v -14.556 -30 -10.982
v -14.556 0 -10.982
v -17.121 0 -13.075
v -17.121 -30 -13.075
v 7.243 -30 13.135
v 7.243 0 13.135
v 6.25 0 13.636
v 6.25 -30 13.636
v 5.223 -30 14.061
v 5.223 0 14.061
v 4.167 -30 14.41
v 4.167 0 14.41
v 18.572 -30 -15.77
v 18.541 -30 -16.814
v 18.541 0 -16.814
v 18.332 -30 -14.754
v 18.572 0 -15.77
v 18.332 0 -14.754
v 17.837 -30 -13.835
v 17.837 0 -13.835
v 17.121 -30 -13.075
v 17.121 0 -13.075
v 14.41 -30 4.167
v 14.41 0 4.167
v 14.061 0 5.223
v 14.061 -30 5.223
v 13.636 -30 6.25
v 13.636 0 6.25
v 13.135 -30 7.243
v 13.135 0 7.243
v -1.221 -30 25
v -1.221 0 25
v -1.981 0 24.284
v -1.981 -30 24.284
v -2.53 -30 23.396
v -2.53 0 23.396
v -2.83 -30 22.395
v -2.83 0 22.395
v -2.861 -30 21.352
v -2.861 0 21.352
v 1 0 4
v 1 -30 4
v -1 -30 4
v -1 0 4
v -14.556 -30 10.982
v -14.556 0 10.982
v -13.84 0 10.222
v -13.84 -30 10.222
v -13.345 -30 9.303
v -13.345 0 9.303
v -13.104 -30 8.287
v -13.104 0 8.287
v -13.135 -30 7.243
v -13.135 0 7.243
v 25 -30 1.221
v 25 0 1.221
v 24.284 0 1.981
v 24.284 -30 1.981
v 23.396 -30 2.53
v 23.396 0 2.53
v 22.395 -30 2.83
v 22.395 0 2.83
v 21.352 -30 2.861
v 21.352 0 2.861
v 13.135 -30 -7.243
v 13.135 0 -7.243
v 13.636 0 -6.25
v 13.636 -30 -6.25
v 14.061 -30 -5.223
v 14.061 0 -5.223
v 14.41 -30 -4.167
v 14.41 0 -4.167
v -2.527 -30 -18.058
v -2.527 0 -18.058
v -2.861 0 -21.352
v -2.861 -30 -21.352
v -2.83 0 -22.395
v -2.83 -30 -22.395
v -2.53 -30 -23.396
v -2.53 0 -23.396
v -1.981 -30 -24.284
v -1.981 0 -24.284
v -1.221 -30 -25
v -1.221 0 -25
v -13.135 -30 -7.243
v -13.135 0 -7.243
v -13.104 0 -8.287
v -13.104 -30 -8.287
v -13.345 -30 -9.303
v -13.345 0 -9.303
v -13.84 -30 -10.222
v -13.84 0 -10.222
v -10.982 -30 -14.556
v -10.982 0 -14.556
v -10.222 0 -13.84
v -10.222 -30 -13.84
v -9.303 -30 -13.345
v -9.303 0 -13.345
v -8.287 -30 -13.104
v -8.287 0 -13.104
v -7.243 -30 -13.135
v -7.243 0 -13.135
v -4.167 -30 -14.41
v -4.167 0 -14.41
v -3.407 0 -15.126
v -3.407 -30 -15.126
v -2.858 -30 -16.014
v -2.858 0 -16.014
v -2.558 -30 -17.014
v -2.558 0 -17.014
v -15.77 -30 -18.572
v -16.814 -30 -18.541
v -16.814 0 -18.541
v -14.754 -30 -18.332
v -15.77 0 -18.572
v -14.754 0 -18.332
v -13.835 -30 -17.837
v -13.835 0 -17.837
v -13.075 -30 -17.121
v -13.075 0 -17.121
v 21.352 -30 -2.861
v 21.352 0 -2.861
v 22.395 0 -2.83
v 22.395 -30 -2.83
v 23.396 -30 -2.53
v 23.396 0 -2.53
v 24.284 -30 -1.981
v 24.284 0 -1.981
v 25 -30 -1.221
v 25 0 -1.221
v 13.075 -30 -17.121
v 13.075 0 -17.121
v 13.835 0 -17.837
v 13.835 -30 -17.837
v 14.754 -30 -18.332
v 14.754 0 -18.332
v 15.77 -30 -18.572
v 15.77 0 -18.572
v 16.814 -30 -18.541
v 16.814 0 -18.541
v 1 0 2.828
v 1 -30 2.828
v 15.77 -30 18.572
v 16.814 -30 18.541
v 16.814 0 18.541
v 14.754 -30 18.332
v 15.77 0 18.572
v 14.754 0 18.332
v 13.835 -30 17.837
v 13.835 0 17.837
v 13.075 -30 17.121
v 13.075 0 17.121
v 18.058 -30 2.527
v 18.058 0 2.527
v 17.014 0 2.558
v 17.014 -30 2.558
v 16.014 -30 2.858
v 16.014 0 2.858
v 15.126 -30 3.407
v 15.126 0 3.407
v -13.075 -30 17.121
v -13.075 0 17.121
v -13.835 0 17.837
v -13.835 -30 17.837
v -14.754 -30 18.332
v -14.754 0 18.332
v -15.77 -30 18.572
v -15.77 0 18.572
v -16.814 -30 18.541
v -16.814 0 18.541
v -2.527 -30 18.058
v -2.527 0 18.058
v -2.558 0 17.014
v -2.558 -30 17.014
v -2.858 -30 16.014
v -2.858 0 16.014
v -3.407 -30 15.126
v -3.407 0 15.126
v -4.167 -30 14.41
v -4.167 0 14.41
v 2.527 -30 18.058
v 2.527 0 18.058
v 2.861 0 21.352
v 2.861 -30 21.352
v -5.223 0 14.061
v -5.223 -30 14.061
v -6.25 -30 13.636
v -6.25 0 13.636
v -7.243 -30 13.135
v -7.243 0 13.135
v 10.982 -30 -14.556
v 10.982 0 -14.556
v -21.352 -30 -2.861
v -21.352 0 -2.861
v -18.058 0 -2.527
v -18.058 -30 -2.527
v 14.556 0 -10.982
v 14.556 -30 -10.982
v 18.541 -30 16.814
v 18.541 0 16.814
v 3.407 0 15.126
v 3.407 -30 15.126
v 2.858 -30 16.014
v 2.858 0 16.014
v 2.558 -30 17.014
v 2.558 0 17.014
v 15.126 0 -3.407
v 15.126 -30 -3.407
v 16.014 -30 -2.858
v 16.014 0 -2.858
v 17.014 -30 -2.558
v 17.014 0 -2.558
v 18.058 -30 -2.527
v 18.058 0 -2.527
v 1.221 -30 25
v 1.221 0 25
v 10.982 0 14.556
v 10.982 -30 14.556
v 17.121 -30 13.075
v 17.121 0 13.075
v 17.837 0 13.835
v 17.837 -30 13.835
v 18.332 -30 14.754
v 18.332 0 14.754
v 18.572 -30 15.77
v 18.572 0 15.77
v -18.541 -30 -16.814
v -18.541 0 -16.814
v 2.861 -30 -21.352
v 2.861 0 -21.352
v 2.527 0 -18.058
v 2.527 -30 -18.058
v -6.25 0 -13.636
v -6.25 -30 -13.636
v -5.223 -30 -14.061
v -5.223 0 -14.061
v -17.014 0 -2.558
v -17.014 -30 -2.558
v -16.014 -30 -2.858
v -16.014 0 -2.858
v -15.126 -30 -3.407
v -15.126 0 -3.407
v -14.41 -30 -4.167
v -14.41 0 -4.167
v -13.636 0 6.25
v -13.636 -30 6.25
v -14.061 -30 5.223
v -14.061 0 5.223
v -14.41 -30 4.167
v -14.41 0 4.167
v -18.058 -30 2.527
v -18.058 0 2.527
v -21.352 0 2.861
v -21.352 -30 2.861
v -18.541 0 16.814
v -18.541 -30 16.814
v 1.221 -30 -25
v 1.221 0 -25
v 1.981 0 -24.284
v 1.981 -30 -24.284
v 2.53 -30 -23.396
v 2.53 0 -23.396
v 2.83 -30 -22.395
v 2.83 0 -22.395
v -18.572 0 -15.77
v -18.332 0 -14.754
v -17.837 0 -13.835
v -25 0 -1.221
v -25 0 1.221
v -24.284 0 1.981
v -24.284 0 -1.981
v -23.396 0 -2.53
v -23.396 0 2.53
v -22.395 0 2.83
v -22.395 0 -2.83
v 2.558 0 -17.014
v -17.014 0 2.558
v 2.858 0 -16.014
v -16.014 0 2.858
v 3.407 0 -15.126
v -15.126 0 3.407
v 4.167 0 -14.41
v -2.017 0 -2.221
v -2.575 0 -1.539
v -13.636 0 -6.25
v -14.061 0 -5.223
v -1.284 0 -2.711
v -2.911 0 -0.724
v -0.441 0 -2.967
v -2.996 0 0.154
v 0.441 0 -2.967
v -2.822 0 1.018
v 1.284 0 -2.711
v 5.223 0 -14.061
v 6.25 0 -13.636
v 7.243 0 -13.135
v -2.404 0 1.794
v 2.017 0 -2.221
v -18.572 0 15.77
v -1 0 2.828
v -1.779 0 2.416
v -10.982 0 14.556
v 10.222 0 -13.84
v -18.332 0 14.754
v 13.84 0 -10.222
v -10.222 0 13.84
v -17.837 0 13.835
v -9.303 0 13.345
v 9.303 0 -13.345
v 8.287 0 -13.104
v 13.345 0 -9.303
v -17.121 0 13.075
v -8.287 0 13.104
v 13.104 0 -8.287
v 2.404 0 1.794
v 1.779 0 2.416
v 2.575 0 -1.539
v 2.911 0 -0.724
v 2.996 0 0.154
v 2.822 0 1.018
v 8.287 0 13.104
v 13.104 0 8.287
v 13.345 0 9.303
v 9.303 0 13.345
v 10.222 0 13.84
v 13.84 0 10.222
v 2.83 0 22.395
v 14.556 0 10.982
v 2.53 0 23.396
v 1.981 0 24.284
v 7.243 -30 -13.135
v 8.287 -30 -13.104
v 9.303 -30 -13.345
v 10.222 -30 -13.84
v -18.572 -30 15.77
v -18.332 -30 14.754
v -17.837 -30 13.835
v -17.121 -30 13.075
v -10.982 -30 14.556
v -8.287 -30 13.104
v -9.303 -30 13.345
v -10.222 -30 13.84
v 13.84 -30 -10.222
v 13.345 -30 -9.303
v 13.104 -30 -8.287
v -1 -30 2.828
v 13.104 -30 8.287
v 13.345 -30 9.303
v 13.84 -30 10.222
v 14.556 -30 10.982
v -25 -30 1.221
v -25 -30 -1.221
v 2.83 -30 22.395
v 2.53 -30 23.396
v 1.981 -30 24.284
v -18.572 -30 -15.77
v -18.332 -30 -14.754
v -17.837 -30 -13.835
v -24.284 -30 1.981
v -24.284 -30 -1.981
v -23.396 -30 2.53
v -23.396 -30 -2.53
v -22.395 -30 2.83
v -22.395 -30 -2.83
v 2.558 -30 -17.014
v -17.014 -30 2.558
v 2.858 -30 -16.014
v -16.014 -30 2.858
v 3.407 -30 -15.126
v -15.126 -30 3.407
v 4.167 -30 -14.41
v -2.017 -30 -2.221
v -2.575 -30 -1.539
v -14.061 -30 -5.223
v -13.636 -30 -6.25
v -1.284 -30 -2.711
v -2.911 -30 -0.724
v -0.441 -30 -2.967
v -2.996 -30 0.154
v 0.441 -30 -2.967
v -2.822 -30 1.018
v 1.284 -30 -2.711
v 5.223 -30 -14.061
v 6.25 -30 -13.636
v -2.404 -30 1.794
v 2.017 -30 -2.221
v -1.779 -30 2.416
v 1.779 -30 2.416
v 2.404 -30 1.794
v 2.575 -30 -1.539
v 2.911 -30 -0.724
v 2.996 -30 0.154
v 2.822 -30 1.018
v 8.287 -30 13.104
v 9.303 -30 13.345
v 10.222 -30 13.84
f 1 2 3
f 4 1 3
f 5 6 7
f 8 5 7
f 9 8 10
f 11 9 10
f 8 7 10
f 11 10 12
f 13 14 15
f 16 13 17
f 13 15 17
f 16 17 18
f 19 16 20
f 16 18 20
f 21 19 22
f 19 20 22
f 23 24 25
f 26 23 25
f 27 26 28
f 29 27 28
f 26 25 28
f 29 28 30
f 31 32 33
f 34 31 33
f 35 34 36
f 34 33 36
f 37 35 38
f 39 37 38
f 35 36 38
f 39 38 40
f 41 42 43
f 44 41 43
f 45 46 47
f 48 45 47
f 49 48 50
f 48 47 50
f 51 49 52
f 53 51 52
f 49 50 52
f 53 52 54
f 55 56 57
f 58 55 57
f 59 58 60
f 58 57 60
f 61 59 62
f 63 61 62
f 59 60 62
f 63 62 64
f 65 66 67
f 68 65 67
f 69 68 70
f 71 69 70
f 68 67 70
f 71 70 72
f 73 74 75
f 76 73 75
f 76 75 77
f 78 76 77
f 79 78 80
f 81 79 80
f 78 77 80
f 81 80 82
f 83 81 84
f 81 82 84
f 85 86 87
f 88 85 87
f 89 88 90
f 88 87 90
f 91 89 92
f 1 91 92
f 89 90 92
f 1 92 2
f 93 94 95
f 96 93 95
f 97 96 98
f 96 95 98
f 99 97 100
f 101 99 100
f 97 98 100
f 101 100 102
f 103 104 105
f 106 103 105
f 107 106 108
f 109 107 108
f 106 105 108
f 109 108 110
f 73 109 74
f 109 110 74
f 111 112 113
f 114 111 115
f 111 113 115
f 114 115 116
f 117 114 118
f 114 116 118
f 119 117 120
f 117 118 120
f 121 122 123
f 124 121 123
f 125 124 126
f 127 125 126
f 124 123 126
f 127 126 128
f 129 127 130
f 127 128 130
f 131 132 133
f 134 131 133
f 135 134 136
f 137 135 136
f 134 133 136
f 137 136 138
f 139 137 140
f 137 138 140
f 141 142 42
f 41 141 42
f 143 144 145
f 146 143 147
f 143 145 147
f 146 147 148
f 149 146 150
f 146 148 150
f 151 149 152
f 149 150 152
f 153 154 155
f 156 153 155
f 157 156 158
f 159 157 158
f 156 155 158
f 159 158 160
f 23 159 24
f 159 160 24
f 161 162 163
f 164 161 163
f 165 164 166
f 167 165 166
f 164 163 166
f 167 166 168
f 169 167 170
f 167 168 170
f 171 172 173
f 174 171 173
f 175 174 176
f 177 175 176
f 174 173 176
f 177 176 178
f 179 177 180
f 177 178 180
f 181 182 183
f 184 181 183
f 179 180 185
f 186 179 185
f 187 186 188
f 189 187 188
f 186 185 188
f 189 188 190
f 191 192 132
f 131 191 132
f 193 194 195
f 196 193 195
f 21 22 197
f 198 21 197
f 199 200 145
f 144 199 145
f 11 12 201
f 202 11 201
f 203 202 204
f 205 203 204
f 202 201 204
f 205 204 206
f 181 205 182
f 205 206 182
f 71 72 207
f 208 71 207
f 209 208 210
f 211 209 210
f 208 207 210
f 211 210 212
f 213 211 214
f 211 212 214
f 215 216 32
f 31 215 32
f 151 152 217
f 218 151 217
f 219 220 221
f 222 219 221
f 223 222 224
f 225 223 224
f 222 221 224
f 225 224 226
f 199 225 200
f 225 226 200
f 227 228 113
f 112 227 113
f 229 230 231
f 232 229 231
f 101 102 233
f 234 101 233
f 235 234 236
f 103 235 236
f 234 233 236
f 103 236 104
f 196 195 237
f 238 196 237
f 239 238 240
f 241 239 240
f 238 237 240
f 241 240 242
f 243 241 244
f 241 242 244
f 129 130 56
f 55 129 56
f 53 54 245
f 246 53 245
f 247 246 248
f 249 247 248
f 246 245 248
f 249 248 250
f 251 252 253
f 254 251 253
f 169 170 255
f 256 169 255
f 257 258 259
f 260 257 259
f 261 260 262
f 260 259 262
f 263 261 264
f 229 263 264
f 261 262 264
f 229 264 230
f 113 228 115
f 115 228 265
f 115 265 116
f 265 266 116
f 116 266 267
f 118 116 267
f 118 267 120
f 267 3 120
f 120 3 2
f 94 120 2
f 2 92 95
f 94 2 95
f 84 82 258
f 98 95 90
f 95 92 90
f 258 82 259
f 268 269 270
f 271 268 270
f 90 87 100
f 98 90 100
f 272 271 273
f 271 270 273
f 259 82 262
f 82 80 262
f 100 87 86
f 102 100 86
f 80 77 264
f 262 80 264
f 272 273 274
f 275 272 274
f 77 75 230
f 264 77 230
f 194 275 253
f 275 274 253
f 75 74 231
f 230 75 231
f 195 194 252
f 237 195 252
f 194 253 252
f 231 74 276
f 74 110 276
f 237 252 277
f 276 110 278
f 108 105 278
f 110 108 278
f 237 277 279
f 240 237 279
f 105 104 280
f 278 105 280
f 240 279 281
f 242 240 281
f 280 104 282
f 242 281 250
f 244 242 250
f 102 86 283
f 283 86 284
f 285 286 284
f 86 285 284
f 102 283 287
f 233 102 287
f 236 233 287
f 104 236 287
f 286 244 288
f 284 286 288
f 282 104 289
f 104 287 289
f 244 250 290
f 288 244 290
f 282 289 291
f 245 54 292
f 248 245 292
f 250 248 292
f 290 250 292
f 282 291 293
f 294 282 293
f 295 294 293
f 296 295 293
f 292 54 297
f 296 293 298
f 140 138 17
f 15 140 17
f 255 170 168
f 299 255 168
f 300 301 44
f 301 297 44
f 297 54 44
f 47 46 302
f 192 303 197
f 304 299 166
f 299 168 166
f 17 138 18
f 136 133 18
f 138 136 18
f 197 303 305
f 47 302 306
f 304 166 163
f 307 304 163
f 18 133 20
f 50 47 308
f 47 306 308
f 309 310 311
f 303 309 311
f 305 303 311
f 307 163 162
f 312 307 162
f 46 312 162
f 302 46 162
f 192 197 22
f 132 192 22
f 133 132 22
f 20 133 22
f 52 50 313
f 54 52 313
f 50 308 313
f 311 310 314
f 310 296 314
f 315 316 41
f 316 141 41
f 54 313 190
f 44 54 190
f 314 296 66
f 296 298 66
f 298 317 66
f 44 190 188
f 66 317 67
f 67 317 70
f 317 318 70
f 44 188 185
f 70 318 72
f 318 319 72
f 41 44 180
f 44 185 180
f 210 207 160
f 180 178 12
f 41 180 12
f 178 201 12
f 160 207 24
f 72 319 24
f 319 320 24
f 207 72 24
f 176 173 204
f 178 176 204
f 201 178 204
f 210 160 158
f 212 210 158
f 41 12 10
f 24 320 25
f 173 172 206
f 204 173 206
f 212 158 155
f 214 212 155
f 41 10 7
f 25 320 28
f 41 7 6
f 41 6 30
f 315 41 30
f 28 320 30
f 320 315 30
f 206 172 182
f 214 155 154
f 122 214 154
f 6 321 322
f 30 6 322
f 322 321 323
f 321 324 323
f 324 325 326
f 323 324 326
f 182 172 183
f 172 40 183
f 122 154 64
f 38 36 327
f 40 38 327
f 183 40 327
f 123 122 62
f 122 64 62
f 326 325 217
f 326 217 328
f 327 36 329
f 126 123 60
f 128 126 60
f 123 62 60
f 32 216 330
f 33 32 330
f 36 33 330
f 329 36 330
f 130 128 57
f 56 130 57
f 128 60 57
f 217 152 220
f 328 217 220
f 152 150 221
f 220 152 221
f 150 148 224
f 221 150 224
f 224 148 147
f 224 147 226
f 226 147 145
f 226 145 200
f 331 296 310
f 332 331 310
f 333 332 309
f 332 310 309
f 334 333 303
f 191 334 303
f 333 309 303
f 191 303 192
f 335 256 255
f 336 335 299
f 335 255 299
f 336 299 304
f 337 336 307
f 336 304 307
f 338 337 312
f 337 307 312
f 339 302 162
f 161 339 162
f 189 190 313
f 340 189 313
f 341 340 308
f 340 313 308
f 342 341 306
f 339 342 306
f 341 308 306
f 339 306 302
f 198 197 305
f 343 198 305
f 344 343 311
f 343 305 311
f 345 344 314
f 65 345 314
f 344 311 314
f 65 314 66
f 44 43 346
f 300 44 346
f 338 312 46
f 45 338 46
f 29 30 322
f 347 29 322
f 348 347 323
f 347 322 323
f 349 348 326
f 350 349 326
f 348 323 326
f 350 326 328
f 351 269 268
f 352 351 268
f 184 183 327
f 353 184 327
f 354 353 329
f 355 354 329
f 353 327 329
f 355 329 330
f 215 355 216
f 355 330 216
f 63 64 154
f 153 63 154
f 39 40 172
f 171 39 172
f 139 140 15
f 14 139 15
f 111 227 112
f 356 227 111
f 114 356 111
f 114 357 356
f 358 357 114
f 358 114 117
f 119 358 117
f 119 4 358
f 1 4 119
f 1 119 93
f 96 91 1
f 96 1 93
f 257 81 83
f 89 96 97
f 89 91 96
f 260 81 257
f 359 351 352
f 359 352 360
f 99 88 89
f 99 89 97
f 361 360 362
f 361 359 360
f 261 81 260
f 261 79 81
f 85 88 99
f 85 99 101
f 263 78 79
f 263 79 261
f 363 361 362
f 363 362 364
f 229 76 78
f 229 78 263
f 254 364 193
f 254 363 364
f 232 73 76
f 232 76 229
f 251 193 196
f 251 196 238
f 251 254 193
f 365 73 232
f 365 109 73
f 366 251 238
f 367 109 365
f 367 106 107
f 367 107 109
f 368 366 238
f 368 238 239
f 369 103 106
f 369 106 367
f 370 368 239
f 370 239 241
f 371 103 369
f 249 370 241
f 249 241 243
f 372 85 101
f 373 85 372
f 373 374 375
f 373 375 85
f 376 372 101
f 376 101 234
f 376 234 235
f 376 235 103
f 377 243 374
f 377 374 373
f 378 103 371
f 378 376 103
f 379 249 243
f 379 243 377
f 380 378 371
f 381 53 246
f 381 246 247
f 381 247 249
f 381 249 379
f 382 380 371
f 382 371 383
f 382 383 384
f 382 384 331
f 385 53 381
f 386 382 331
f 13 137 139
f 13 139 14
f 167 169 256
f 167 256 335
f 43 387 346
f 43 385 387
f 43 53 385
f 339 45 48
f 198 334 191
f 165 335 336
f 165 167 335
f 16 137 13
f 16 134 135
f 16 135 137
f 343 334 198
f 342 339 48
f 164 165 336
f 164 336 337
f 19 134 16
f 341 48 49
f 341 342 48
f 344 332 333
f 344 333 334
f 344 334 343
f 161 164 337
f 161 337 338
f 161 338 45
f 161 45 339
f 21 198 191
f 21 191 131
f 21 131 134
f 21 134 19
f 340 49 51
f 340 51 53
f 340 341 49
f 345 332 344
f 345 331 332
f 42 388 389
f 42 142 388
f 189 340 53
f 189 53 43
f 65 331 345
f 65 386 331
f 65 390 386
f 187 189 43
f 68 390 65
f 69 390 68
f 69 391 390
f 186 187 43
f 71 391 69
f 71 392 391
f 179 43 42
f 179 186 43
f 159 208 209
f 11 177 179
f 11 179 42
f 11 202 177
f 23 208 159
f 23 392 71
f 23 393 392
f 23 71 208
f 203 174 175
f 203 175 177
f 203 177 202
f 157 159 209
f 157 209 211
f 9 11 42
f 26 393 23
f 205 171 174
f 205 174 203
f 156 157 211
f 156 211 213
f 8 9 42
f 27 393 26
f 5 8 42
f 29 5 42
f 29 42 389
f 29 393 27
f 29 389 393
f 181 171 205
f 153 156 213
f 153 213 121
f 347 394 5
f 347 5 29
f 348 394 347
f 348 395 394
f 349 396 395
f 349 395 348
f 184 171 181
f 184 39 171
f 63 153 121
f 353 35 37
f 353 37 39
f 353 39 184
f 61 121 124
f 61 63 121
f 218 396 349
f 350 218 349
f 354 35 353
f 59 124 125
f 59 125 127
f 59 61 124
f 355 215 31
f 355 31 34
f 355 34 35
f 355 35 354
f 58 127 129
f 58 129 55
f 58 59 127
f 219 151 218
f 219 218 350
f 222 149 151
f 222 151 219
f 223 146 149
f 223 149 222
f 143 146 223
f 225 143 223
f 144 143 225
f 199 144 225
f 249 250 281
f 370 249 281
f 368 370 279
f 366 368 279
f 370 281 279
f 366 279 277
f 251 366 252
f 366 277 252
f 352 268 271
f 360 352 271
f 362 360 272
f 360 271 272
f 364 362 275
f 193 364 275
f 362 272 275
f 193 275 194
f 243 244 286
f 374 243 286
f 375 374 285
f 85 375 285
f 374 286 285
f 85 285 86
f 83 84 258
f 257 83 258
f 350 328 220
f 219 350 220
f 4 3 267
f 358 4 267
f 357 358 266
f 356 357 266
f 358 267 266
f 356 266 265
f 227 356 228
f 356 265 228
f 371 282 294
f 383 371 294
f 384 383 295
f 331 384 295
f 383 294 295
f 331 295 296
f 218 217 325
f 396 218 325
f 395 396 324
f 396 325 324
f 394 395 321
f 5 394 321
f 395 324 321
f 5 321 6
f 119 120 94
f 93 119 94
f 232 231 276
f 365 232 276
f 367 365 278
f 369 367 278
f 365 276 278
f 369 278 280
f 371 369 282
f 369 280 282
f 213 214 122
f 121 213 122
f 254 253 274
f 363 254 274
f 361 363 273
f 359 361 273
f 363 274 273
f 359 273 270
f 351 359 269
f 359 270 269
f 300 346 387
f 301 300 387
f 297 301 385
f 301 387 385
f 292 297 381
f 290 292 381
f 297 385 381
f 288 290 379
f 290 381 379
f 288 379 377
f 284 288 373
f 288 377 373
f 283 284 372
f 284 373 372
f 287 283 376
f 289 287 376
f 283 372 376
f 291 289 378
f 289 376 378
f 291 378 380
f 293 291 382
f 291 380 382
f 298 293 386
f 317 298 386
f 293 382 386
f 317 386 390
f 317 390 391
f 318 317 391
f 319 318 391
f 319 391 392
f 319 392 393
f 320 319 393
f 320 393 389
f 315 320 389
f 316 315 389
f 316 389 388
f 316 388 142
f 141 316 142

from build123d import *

# Parameters (mm, degrees)
F1_DEPTH = 30
F3_DEPTH = 30.001


with BuildPart() as f1:
    # F0 (on Front) → F1 (new body)
    with BuildSketch(Plane.XZ):
        with BuildLine():
            ThreePointArc((-14.555619, 10.982389), (-13.34453, 9.30297), (-13.135405, 7.243005))
            ThreePointArc((-13.135405, 7.243005), (-13.858193, 5.740251), (-14.409712, 4.166556))
            ThreePointArc((-14.409712, 4.166556), (-16.0142, 2.857814), (-18.058099, 2.526655))
            Line((-18.058099, 2.526655), (-21.351614, 2.861007))
            ThreePointArc((-21.351614, 2.861007), (-23.395512, 2.529847), (-25, 1.221105))
            Line((-25, 1.221105), (-25, -1.221105))
            ThreePointArc((-25, -1.221105), (-23.395512, -2.529847), (-21.351614, -2.861007))
            Line((-21.351614, -2.861007), (-18.058099, -2.526655))
            ThreePointArc((-18.058099, -2.526655), (-16.0142, -2.857814), (-14.409712, -4.166556))
            ThreePointArc((-14.409712, -4.166556), (-13.858193, -5.740251), (-13.135405, -7.243005))
            ThreePointArc((-13.135405, -7.243005), (-13.34453, -9.30297), (-14.555619, -10.982389))
            Line((-14.555619, -10.982389), (-17.120908, -13.074834))
            ThreePointArc((-17.120908, -13.074834), (-18.331997, -14.754253), (-18.541121, -16.814218))
            Line((-18.541121, -16.814218), (-16.814218, -18.541121))
            ThreePointArc((-16.814218, -18.541121), (-14.754253, -18.331997), (-13.074834, -17.120908))
            Line((-13.074834, -17.120908), (-10.982389, -14.555619))
            ThreePointArc((-10.982389, -14.555619), (-9.30297, -13.34453), (-7.243005, -13.135405))
            ThreePointArc((-7.243005, -13.135405), (-5.740251, -13.858193), (-4.166556, -14.409712))
            ThreePointArc((-4.166556, -14.409712), (-2.857814, -16.0142), (-2.526655, -18.058099))
            Line((-2.526655, -18.058099), (-2.861007, -21.351614))
            ThreePointArc((-2.861007, -21.351614), (-2.529847, -23.395512), (-1.221105, -25))
            Line((-1.221105, -25), (1.221105, -25))
            ThreePointArc((1.221105, -25), (2.529847, -23.395512), (2.861007, -21.351614))
            Line((2.861007, -21.351614), (2.526655, -18.058099))
            ThreePointArc((2.526655, -18.058099), (2.857814, -16.0142), (4.166556, -14.409712))
            ThreePointArc((4.166556, -14.409712), (5.740251, -13.858193), (7.243005, -13.135405))
            ThreePointArc((7.243005, -13.135405), (9.30297, -13.34453), (10.982389, -14.555619))
            Line((10.982389, -14.555619), (13.074834, -17.120908))
            ThreePointArc((13.074834, -17.120908), (14.754253, -18.331997), (16.814218, -18.541121))
            Line((16.814218, -18.541121), (18.541121, -16.814218))
            ThreePointArc((18.541121, -16.814218), (18.331997, -14.754253), (17.120908, -13.074834))
            Line((17.120908, -13.074834), (14.555619, -10.982389))
            ThreePointArc((14.555619, -10.982389), (13.34453, -9.30297), (13.135405, -7.243005))
            ThreePointArc((13.135405, -7.243005), (13.858193, -5.740251), (14.409712, -4.166556))
            ThreePointArc((14.409712, -4.166556), (16.0142, -2.857814), (18.058099, -2.526655))
            Line((18.058099, -2.526655), (21.351614, -2.861007))
            ThreePointArc((21.351614, -2.861007), (23.395512, -2.529847), (25, -1.221105))
            Line((25, -1.221105), (25, 1.221105))
            ThreePointArc((25, 1.221105), (23.395512, 2.529847), (21.351614, 2.861007))
            Line((21.351614, 2.861007), (18.058099, 2.526655))
            ThreePointArc((18.058099, 2.526655), (16.0142, 2.857814), (14.409712, 4.166556))
            ThreePointArc((14.409712, 4.166556), (13.858193, 5.740251), (13.135405, 7.243005))
            ThreePointArc((13.135405, 7.243005), (13.34453, 9.30297), (14.555619, 10.982389))
            Line((14.555619, 10.982389), (17.120908, 13.074834))
            ThreePointArc((17.120908, 13.074834), (18.331997, 14.754253), (18.541121, 16.814218))
            Line((18.541121, 16.814218), (16.814218, 18.541121))
            ThreePointArc((16.814218, 18.541121), (14.754253, 18.331997), (13.074834, 17.120908))
            Line((13.074834, 17.120908), (10.982389, 14.555619))
            ThreePointArc((10.982389, 14.555619), (9.30297, 13.34453), (7.243005, 13.135405))
            ThreePointArc((7.243005, 13.135405), (5.740251, 13.858193), (4.166556, 14.409712))
            ThreePointArc((4.166556, 14.409712), (2.857814, 16.0142), (2.526655, 18.058099))
            Line((2.526655, 18.058099), (2.861007, 21.351614))
            ThreePointArc((2.861007, 21.351614), (2.529847, 23.395512), (1.221105, 25))
            Line((1.221105, 25), (-1.221105, 25))
            ThreePointArc((-1.221105, 25), (-2.529847, 23.395512), (-2.861007, 21.351614))
            Line((-2.861007, 21.351614), (-2.526655, 18.058099))
            ThreePointArc((-2.526655, 18.058099), (-2.857814, 16.0142), (-4.166556, 14.409712))
            ThreePointArc((-4.166556, 14.409712), (-5.740251, 13.858193), (-7.243005, 13.135405))
            ThreePointArc((-7.243005, 13.135405), (-9.30297, 13.34453), (-10.982389, 14.555619))
            Line((-10.982389, 14.555619), (-13.074834, 17.120908))
            ThreePointArc((-13.074834, 17.120908), (-14.754253, 18.331997), (-16.814218, 18.541121))
            Line((-16.814218, 18.541121), (-18.541121, 16.814218))
            ThreePointArc((-18.541121, 16.814218), (-18.331997, 14.754253), (-17.120908, 13.074834))
            Line((-17.120908, 13.074834), (-14.555619, 10.982389))
        make_face()
    extrude(amount=F1_DEPTH)

    # F2 (on face) → F3 (cut, through all)
    with BuildSketch(Plane.XZ.offset(30)):
        with BuildLine():
            Line((-1, 4), (-1, 2.828427))
            ThreePointArc((-1, 2.828427), (0, -3), (1, 2.828427))
            Line((1, 2.828427), (1, 4))
            Line((1, 4), (-1, 4))
        make_face()
    extrude(amount=-F3_DEPTH, mode=Mode.SUBTRACT)


solid = f1.part
